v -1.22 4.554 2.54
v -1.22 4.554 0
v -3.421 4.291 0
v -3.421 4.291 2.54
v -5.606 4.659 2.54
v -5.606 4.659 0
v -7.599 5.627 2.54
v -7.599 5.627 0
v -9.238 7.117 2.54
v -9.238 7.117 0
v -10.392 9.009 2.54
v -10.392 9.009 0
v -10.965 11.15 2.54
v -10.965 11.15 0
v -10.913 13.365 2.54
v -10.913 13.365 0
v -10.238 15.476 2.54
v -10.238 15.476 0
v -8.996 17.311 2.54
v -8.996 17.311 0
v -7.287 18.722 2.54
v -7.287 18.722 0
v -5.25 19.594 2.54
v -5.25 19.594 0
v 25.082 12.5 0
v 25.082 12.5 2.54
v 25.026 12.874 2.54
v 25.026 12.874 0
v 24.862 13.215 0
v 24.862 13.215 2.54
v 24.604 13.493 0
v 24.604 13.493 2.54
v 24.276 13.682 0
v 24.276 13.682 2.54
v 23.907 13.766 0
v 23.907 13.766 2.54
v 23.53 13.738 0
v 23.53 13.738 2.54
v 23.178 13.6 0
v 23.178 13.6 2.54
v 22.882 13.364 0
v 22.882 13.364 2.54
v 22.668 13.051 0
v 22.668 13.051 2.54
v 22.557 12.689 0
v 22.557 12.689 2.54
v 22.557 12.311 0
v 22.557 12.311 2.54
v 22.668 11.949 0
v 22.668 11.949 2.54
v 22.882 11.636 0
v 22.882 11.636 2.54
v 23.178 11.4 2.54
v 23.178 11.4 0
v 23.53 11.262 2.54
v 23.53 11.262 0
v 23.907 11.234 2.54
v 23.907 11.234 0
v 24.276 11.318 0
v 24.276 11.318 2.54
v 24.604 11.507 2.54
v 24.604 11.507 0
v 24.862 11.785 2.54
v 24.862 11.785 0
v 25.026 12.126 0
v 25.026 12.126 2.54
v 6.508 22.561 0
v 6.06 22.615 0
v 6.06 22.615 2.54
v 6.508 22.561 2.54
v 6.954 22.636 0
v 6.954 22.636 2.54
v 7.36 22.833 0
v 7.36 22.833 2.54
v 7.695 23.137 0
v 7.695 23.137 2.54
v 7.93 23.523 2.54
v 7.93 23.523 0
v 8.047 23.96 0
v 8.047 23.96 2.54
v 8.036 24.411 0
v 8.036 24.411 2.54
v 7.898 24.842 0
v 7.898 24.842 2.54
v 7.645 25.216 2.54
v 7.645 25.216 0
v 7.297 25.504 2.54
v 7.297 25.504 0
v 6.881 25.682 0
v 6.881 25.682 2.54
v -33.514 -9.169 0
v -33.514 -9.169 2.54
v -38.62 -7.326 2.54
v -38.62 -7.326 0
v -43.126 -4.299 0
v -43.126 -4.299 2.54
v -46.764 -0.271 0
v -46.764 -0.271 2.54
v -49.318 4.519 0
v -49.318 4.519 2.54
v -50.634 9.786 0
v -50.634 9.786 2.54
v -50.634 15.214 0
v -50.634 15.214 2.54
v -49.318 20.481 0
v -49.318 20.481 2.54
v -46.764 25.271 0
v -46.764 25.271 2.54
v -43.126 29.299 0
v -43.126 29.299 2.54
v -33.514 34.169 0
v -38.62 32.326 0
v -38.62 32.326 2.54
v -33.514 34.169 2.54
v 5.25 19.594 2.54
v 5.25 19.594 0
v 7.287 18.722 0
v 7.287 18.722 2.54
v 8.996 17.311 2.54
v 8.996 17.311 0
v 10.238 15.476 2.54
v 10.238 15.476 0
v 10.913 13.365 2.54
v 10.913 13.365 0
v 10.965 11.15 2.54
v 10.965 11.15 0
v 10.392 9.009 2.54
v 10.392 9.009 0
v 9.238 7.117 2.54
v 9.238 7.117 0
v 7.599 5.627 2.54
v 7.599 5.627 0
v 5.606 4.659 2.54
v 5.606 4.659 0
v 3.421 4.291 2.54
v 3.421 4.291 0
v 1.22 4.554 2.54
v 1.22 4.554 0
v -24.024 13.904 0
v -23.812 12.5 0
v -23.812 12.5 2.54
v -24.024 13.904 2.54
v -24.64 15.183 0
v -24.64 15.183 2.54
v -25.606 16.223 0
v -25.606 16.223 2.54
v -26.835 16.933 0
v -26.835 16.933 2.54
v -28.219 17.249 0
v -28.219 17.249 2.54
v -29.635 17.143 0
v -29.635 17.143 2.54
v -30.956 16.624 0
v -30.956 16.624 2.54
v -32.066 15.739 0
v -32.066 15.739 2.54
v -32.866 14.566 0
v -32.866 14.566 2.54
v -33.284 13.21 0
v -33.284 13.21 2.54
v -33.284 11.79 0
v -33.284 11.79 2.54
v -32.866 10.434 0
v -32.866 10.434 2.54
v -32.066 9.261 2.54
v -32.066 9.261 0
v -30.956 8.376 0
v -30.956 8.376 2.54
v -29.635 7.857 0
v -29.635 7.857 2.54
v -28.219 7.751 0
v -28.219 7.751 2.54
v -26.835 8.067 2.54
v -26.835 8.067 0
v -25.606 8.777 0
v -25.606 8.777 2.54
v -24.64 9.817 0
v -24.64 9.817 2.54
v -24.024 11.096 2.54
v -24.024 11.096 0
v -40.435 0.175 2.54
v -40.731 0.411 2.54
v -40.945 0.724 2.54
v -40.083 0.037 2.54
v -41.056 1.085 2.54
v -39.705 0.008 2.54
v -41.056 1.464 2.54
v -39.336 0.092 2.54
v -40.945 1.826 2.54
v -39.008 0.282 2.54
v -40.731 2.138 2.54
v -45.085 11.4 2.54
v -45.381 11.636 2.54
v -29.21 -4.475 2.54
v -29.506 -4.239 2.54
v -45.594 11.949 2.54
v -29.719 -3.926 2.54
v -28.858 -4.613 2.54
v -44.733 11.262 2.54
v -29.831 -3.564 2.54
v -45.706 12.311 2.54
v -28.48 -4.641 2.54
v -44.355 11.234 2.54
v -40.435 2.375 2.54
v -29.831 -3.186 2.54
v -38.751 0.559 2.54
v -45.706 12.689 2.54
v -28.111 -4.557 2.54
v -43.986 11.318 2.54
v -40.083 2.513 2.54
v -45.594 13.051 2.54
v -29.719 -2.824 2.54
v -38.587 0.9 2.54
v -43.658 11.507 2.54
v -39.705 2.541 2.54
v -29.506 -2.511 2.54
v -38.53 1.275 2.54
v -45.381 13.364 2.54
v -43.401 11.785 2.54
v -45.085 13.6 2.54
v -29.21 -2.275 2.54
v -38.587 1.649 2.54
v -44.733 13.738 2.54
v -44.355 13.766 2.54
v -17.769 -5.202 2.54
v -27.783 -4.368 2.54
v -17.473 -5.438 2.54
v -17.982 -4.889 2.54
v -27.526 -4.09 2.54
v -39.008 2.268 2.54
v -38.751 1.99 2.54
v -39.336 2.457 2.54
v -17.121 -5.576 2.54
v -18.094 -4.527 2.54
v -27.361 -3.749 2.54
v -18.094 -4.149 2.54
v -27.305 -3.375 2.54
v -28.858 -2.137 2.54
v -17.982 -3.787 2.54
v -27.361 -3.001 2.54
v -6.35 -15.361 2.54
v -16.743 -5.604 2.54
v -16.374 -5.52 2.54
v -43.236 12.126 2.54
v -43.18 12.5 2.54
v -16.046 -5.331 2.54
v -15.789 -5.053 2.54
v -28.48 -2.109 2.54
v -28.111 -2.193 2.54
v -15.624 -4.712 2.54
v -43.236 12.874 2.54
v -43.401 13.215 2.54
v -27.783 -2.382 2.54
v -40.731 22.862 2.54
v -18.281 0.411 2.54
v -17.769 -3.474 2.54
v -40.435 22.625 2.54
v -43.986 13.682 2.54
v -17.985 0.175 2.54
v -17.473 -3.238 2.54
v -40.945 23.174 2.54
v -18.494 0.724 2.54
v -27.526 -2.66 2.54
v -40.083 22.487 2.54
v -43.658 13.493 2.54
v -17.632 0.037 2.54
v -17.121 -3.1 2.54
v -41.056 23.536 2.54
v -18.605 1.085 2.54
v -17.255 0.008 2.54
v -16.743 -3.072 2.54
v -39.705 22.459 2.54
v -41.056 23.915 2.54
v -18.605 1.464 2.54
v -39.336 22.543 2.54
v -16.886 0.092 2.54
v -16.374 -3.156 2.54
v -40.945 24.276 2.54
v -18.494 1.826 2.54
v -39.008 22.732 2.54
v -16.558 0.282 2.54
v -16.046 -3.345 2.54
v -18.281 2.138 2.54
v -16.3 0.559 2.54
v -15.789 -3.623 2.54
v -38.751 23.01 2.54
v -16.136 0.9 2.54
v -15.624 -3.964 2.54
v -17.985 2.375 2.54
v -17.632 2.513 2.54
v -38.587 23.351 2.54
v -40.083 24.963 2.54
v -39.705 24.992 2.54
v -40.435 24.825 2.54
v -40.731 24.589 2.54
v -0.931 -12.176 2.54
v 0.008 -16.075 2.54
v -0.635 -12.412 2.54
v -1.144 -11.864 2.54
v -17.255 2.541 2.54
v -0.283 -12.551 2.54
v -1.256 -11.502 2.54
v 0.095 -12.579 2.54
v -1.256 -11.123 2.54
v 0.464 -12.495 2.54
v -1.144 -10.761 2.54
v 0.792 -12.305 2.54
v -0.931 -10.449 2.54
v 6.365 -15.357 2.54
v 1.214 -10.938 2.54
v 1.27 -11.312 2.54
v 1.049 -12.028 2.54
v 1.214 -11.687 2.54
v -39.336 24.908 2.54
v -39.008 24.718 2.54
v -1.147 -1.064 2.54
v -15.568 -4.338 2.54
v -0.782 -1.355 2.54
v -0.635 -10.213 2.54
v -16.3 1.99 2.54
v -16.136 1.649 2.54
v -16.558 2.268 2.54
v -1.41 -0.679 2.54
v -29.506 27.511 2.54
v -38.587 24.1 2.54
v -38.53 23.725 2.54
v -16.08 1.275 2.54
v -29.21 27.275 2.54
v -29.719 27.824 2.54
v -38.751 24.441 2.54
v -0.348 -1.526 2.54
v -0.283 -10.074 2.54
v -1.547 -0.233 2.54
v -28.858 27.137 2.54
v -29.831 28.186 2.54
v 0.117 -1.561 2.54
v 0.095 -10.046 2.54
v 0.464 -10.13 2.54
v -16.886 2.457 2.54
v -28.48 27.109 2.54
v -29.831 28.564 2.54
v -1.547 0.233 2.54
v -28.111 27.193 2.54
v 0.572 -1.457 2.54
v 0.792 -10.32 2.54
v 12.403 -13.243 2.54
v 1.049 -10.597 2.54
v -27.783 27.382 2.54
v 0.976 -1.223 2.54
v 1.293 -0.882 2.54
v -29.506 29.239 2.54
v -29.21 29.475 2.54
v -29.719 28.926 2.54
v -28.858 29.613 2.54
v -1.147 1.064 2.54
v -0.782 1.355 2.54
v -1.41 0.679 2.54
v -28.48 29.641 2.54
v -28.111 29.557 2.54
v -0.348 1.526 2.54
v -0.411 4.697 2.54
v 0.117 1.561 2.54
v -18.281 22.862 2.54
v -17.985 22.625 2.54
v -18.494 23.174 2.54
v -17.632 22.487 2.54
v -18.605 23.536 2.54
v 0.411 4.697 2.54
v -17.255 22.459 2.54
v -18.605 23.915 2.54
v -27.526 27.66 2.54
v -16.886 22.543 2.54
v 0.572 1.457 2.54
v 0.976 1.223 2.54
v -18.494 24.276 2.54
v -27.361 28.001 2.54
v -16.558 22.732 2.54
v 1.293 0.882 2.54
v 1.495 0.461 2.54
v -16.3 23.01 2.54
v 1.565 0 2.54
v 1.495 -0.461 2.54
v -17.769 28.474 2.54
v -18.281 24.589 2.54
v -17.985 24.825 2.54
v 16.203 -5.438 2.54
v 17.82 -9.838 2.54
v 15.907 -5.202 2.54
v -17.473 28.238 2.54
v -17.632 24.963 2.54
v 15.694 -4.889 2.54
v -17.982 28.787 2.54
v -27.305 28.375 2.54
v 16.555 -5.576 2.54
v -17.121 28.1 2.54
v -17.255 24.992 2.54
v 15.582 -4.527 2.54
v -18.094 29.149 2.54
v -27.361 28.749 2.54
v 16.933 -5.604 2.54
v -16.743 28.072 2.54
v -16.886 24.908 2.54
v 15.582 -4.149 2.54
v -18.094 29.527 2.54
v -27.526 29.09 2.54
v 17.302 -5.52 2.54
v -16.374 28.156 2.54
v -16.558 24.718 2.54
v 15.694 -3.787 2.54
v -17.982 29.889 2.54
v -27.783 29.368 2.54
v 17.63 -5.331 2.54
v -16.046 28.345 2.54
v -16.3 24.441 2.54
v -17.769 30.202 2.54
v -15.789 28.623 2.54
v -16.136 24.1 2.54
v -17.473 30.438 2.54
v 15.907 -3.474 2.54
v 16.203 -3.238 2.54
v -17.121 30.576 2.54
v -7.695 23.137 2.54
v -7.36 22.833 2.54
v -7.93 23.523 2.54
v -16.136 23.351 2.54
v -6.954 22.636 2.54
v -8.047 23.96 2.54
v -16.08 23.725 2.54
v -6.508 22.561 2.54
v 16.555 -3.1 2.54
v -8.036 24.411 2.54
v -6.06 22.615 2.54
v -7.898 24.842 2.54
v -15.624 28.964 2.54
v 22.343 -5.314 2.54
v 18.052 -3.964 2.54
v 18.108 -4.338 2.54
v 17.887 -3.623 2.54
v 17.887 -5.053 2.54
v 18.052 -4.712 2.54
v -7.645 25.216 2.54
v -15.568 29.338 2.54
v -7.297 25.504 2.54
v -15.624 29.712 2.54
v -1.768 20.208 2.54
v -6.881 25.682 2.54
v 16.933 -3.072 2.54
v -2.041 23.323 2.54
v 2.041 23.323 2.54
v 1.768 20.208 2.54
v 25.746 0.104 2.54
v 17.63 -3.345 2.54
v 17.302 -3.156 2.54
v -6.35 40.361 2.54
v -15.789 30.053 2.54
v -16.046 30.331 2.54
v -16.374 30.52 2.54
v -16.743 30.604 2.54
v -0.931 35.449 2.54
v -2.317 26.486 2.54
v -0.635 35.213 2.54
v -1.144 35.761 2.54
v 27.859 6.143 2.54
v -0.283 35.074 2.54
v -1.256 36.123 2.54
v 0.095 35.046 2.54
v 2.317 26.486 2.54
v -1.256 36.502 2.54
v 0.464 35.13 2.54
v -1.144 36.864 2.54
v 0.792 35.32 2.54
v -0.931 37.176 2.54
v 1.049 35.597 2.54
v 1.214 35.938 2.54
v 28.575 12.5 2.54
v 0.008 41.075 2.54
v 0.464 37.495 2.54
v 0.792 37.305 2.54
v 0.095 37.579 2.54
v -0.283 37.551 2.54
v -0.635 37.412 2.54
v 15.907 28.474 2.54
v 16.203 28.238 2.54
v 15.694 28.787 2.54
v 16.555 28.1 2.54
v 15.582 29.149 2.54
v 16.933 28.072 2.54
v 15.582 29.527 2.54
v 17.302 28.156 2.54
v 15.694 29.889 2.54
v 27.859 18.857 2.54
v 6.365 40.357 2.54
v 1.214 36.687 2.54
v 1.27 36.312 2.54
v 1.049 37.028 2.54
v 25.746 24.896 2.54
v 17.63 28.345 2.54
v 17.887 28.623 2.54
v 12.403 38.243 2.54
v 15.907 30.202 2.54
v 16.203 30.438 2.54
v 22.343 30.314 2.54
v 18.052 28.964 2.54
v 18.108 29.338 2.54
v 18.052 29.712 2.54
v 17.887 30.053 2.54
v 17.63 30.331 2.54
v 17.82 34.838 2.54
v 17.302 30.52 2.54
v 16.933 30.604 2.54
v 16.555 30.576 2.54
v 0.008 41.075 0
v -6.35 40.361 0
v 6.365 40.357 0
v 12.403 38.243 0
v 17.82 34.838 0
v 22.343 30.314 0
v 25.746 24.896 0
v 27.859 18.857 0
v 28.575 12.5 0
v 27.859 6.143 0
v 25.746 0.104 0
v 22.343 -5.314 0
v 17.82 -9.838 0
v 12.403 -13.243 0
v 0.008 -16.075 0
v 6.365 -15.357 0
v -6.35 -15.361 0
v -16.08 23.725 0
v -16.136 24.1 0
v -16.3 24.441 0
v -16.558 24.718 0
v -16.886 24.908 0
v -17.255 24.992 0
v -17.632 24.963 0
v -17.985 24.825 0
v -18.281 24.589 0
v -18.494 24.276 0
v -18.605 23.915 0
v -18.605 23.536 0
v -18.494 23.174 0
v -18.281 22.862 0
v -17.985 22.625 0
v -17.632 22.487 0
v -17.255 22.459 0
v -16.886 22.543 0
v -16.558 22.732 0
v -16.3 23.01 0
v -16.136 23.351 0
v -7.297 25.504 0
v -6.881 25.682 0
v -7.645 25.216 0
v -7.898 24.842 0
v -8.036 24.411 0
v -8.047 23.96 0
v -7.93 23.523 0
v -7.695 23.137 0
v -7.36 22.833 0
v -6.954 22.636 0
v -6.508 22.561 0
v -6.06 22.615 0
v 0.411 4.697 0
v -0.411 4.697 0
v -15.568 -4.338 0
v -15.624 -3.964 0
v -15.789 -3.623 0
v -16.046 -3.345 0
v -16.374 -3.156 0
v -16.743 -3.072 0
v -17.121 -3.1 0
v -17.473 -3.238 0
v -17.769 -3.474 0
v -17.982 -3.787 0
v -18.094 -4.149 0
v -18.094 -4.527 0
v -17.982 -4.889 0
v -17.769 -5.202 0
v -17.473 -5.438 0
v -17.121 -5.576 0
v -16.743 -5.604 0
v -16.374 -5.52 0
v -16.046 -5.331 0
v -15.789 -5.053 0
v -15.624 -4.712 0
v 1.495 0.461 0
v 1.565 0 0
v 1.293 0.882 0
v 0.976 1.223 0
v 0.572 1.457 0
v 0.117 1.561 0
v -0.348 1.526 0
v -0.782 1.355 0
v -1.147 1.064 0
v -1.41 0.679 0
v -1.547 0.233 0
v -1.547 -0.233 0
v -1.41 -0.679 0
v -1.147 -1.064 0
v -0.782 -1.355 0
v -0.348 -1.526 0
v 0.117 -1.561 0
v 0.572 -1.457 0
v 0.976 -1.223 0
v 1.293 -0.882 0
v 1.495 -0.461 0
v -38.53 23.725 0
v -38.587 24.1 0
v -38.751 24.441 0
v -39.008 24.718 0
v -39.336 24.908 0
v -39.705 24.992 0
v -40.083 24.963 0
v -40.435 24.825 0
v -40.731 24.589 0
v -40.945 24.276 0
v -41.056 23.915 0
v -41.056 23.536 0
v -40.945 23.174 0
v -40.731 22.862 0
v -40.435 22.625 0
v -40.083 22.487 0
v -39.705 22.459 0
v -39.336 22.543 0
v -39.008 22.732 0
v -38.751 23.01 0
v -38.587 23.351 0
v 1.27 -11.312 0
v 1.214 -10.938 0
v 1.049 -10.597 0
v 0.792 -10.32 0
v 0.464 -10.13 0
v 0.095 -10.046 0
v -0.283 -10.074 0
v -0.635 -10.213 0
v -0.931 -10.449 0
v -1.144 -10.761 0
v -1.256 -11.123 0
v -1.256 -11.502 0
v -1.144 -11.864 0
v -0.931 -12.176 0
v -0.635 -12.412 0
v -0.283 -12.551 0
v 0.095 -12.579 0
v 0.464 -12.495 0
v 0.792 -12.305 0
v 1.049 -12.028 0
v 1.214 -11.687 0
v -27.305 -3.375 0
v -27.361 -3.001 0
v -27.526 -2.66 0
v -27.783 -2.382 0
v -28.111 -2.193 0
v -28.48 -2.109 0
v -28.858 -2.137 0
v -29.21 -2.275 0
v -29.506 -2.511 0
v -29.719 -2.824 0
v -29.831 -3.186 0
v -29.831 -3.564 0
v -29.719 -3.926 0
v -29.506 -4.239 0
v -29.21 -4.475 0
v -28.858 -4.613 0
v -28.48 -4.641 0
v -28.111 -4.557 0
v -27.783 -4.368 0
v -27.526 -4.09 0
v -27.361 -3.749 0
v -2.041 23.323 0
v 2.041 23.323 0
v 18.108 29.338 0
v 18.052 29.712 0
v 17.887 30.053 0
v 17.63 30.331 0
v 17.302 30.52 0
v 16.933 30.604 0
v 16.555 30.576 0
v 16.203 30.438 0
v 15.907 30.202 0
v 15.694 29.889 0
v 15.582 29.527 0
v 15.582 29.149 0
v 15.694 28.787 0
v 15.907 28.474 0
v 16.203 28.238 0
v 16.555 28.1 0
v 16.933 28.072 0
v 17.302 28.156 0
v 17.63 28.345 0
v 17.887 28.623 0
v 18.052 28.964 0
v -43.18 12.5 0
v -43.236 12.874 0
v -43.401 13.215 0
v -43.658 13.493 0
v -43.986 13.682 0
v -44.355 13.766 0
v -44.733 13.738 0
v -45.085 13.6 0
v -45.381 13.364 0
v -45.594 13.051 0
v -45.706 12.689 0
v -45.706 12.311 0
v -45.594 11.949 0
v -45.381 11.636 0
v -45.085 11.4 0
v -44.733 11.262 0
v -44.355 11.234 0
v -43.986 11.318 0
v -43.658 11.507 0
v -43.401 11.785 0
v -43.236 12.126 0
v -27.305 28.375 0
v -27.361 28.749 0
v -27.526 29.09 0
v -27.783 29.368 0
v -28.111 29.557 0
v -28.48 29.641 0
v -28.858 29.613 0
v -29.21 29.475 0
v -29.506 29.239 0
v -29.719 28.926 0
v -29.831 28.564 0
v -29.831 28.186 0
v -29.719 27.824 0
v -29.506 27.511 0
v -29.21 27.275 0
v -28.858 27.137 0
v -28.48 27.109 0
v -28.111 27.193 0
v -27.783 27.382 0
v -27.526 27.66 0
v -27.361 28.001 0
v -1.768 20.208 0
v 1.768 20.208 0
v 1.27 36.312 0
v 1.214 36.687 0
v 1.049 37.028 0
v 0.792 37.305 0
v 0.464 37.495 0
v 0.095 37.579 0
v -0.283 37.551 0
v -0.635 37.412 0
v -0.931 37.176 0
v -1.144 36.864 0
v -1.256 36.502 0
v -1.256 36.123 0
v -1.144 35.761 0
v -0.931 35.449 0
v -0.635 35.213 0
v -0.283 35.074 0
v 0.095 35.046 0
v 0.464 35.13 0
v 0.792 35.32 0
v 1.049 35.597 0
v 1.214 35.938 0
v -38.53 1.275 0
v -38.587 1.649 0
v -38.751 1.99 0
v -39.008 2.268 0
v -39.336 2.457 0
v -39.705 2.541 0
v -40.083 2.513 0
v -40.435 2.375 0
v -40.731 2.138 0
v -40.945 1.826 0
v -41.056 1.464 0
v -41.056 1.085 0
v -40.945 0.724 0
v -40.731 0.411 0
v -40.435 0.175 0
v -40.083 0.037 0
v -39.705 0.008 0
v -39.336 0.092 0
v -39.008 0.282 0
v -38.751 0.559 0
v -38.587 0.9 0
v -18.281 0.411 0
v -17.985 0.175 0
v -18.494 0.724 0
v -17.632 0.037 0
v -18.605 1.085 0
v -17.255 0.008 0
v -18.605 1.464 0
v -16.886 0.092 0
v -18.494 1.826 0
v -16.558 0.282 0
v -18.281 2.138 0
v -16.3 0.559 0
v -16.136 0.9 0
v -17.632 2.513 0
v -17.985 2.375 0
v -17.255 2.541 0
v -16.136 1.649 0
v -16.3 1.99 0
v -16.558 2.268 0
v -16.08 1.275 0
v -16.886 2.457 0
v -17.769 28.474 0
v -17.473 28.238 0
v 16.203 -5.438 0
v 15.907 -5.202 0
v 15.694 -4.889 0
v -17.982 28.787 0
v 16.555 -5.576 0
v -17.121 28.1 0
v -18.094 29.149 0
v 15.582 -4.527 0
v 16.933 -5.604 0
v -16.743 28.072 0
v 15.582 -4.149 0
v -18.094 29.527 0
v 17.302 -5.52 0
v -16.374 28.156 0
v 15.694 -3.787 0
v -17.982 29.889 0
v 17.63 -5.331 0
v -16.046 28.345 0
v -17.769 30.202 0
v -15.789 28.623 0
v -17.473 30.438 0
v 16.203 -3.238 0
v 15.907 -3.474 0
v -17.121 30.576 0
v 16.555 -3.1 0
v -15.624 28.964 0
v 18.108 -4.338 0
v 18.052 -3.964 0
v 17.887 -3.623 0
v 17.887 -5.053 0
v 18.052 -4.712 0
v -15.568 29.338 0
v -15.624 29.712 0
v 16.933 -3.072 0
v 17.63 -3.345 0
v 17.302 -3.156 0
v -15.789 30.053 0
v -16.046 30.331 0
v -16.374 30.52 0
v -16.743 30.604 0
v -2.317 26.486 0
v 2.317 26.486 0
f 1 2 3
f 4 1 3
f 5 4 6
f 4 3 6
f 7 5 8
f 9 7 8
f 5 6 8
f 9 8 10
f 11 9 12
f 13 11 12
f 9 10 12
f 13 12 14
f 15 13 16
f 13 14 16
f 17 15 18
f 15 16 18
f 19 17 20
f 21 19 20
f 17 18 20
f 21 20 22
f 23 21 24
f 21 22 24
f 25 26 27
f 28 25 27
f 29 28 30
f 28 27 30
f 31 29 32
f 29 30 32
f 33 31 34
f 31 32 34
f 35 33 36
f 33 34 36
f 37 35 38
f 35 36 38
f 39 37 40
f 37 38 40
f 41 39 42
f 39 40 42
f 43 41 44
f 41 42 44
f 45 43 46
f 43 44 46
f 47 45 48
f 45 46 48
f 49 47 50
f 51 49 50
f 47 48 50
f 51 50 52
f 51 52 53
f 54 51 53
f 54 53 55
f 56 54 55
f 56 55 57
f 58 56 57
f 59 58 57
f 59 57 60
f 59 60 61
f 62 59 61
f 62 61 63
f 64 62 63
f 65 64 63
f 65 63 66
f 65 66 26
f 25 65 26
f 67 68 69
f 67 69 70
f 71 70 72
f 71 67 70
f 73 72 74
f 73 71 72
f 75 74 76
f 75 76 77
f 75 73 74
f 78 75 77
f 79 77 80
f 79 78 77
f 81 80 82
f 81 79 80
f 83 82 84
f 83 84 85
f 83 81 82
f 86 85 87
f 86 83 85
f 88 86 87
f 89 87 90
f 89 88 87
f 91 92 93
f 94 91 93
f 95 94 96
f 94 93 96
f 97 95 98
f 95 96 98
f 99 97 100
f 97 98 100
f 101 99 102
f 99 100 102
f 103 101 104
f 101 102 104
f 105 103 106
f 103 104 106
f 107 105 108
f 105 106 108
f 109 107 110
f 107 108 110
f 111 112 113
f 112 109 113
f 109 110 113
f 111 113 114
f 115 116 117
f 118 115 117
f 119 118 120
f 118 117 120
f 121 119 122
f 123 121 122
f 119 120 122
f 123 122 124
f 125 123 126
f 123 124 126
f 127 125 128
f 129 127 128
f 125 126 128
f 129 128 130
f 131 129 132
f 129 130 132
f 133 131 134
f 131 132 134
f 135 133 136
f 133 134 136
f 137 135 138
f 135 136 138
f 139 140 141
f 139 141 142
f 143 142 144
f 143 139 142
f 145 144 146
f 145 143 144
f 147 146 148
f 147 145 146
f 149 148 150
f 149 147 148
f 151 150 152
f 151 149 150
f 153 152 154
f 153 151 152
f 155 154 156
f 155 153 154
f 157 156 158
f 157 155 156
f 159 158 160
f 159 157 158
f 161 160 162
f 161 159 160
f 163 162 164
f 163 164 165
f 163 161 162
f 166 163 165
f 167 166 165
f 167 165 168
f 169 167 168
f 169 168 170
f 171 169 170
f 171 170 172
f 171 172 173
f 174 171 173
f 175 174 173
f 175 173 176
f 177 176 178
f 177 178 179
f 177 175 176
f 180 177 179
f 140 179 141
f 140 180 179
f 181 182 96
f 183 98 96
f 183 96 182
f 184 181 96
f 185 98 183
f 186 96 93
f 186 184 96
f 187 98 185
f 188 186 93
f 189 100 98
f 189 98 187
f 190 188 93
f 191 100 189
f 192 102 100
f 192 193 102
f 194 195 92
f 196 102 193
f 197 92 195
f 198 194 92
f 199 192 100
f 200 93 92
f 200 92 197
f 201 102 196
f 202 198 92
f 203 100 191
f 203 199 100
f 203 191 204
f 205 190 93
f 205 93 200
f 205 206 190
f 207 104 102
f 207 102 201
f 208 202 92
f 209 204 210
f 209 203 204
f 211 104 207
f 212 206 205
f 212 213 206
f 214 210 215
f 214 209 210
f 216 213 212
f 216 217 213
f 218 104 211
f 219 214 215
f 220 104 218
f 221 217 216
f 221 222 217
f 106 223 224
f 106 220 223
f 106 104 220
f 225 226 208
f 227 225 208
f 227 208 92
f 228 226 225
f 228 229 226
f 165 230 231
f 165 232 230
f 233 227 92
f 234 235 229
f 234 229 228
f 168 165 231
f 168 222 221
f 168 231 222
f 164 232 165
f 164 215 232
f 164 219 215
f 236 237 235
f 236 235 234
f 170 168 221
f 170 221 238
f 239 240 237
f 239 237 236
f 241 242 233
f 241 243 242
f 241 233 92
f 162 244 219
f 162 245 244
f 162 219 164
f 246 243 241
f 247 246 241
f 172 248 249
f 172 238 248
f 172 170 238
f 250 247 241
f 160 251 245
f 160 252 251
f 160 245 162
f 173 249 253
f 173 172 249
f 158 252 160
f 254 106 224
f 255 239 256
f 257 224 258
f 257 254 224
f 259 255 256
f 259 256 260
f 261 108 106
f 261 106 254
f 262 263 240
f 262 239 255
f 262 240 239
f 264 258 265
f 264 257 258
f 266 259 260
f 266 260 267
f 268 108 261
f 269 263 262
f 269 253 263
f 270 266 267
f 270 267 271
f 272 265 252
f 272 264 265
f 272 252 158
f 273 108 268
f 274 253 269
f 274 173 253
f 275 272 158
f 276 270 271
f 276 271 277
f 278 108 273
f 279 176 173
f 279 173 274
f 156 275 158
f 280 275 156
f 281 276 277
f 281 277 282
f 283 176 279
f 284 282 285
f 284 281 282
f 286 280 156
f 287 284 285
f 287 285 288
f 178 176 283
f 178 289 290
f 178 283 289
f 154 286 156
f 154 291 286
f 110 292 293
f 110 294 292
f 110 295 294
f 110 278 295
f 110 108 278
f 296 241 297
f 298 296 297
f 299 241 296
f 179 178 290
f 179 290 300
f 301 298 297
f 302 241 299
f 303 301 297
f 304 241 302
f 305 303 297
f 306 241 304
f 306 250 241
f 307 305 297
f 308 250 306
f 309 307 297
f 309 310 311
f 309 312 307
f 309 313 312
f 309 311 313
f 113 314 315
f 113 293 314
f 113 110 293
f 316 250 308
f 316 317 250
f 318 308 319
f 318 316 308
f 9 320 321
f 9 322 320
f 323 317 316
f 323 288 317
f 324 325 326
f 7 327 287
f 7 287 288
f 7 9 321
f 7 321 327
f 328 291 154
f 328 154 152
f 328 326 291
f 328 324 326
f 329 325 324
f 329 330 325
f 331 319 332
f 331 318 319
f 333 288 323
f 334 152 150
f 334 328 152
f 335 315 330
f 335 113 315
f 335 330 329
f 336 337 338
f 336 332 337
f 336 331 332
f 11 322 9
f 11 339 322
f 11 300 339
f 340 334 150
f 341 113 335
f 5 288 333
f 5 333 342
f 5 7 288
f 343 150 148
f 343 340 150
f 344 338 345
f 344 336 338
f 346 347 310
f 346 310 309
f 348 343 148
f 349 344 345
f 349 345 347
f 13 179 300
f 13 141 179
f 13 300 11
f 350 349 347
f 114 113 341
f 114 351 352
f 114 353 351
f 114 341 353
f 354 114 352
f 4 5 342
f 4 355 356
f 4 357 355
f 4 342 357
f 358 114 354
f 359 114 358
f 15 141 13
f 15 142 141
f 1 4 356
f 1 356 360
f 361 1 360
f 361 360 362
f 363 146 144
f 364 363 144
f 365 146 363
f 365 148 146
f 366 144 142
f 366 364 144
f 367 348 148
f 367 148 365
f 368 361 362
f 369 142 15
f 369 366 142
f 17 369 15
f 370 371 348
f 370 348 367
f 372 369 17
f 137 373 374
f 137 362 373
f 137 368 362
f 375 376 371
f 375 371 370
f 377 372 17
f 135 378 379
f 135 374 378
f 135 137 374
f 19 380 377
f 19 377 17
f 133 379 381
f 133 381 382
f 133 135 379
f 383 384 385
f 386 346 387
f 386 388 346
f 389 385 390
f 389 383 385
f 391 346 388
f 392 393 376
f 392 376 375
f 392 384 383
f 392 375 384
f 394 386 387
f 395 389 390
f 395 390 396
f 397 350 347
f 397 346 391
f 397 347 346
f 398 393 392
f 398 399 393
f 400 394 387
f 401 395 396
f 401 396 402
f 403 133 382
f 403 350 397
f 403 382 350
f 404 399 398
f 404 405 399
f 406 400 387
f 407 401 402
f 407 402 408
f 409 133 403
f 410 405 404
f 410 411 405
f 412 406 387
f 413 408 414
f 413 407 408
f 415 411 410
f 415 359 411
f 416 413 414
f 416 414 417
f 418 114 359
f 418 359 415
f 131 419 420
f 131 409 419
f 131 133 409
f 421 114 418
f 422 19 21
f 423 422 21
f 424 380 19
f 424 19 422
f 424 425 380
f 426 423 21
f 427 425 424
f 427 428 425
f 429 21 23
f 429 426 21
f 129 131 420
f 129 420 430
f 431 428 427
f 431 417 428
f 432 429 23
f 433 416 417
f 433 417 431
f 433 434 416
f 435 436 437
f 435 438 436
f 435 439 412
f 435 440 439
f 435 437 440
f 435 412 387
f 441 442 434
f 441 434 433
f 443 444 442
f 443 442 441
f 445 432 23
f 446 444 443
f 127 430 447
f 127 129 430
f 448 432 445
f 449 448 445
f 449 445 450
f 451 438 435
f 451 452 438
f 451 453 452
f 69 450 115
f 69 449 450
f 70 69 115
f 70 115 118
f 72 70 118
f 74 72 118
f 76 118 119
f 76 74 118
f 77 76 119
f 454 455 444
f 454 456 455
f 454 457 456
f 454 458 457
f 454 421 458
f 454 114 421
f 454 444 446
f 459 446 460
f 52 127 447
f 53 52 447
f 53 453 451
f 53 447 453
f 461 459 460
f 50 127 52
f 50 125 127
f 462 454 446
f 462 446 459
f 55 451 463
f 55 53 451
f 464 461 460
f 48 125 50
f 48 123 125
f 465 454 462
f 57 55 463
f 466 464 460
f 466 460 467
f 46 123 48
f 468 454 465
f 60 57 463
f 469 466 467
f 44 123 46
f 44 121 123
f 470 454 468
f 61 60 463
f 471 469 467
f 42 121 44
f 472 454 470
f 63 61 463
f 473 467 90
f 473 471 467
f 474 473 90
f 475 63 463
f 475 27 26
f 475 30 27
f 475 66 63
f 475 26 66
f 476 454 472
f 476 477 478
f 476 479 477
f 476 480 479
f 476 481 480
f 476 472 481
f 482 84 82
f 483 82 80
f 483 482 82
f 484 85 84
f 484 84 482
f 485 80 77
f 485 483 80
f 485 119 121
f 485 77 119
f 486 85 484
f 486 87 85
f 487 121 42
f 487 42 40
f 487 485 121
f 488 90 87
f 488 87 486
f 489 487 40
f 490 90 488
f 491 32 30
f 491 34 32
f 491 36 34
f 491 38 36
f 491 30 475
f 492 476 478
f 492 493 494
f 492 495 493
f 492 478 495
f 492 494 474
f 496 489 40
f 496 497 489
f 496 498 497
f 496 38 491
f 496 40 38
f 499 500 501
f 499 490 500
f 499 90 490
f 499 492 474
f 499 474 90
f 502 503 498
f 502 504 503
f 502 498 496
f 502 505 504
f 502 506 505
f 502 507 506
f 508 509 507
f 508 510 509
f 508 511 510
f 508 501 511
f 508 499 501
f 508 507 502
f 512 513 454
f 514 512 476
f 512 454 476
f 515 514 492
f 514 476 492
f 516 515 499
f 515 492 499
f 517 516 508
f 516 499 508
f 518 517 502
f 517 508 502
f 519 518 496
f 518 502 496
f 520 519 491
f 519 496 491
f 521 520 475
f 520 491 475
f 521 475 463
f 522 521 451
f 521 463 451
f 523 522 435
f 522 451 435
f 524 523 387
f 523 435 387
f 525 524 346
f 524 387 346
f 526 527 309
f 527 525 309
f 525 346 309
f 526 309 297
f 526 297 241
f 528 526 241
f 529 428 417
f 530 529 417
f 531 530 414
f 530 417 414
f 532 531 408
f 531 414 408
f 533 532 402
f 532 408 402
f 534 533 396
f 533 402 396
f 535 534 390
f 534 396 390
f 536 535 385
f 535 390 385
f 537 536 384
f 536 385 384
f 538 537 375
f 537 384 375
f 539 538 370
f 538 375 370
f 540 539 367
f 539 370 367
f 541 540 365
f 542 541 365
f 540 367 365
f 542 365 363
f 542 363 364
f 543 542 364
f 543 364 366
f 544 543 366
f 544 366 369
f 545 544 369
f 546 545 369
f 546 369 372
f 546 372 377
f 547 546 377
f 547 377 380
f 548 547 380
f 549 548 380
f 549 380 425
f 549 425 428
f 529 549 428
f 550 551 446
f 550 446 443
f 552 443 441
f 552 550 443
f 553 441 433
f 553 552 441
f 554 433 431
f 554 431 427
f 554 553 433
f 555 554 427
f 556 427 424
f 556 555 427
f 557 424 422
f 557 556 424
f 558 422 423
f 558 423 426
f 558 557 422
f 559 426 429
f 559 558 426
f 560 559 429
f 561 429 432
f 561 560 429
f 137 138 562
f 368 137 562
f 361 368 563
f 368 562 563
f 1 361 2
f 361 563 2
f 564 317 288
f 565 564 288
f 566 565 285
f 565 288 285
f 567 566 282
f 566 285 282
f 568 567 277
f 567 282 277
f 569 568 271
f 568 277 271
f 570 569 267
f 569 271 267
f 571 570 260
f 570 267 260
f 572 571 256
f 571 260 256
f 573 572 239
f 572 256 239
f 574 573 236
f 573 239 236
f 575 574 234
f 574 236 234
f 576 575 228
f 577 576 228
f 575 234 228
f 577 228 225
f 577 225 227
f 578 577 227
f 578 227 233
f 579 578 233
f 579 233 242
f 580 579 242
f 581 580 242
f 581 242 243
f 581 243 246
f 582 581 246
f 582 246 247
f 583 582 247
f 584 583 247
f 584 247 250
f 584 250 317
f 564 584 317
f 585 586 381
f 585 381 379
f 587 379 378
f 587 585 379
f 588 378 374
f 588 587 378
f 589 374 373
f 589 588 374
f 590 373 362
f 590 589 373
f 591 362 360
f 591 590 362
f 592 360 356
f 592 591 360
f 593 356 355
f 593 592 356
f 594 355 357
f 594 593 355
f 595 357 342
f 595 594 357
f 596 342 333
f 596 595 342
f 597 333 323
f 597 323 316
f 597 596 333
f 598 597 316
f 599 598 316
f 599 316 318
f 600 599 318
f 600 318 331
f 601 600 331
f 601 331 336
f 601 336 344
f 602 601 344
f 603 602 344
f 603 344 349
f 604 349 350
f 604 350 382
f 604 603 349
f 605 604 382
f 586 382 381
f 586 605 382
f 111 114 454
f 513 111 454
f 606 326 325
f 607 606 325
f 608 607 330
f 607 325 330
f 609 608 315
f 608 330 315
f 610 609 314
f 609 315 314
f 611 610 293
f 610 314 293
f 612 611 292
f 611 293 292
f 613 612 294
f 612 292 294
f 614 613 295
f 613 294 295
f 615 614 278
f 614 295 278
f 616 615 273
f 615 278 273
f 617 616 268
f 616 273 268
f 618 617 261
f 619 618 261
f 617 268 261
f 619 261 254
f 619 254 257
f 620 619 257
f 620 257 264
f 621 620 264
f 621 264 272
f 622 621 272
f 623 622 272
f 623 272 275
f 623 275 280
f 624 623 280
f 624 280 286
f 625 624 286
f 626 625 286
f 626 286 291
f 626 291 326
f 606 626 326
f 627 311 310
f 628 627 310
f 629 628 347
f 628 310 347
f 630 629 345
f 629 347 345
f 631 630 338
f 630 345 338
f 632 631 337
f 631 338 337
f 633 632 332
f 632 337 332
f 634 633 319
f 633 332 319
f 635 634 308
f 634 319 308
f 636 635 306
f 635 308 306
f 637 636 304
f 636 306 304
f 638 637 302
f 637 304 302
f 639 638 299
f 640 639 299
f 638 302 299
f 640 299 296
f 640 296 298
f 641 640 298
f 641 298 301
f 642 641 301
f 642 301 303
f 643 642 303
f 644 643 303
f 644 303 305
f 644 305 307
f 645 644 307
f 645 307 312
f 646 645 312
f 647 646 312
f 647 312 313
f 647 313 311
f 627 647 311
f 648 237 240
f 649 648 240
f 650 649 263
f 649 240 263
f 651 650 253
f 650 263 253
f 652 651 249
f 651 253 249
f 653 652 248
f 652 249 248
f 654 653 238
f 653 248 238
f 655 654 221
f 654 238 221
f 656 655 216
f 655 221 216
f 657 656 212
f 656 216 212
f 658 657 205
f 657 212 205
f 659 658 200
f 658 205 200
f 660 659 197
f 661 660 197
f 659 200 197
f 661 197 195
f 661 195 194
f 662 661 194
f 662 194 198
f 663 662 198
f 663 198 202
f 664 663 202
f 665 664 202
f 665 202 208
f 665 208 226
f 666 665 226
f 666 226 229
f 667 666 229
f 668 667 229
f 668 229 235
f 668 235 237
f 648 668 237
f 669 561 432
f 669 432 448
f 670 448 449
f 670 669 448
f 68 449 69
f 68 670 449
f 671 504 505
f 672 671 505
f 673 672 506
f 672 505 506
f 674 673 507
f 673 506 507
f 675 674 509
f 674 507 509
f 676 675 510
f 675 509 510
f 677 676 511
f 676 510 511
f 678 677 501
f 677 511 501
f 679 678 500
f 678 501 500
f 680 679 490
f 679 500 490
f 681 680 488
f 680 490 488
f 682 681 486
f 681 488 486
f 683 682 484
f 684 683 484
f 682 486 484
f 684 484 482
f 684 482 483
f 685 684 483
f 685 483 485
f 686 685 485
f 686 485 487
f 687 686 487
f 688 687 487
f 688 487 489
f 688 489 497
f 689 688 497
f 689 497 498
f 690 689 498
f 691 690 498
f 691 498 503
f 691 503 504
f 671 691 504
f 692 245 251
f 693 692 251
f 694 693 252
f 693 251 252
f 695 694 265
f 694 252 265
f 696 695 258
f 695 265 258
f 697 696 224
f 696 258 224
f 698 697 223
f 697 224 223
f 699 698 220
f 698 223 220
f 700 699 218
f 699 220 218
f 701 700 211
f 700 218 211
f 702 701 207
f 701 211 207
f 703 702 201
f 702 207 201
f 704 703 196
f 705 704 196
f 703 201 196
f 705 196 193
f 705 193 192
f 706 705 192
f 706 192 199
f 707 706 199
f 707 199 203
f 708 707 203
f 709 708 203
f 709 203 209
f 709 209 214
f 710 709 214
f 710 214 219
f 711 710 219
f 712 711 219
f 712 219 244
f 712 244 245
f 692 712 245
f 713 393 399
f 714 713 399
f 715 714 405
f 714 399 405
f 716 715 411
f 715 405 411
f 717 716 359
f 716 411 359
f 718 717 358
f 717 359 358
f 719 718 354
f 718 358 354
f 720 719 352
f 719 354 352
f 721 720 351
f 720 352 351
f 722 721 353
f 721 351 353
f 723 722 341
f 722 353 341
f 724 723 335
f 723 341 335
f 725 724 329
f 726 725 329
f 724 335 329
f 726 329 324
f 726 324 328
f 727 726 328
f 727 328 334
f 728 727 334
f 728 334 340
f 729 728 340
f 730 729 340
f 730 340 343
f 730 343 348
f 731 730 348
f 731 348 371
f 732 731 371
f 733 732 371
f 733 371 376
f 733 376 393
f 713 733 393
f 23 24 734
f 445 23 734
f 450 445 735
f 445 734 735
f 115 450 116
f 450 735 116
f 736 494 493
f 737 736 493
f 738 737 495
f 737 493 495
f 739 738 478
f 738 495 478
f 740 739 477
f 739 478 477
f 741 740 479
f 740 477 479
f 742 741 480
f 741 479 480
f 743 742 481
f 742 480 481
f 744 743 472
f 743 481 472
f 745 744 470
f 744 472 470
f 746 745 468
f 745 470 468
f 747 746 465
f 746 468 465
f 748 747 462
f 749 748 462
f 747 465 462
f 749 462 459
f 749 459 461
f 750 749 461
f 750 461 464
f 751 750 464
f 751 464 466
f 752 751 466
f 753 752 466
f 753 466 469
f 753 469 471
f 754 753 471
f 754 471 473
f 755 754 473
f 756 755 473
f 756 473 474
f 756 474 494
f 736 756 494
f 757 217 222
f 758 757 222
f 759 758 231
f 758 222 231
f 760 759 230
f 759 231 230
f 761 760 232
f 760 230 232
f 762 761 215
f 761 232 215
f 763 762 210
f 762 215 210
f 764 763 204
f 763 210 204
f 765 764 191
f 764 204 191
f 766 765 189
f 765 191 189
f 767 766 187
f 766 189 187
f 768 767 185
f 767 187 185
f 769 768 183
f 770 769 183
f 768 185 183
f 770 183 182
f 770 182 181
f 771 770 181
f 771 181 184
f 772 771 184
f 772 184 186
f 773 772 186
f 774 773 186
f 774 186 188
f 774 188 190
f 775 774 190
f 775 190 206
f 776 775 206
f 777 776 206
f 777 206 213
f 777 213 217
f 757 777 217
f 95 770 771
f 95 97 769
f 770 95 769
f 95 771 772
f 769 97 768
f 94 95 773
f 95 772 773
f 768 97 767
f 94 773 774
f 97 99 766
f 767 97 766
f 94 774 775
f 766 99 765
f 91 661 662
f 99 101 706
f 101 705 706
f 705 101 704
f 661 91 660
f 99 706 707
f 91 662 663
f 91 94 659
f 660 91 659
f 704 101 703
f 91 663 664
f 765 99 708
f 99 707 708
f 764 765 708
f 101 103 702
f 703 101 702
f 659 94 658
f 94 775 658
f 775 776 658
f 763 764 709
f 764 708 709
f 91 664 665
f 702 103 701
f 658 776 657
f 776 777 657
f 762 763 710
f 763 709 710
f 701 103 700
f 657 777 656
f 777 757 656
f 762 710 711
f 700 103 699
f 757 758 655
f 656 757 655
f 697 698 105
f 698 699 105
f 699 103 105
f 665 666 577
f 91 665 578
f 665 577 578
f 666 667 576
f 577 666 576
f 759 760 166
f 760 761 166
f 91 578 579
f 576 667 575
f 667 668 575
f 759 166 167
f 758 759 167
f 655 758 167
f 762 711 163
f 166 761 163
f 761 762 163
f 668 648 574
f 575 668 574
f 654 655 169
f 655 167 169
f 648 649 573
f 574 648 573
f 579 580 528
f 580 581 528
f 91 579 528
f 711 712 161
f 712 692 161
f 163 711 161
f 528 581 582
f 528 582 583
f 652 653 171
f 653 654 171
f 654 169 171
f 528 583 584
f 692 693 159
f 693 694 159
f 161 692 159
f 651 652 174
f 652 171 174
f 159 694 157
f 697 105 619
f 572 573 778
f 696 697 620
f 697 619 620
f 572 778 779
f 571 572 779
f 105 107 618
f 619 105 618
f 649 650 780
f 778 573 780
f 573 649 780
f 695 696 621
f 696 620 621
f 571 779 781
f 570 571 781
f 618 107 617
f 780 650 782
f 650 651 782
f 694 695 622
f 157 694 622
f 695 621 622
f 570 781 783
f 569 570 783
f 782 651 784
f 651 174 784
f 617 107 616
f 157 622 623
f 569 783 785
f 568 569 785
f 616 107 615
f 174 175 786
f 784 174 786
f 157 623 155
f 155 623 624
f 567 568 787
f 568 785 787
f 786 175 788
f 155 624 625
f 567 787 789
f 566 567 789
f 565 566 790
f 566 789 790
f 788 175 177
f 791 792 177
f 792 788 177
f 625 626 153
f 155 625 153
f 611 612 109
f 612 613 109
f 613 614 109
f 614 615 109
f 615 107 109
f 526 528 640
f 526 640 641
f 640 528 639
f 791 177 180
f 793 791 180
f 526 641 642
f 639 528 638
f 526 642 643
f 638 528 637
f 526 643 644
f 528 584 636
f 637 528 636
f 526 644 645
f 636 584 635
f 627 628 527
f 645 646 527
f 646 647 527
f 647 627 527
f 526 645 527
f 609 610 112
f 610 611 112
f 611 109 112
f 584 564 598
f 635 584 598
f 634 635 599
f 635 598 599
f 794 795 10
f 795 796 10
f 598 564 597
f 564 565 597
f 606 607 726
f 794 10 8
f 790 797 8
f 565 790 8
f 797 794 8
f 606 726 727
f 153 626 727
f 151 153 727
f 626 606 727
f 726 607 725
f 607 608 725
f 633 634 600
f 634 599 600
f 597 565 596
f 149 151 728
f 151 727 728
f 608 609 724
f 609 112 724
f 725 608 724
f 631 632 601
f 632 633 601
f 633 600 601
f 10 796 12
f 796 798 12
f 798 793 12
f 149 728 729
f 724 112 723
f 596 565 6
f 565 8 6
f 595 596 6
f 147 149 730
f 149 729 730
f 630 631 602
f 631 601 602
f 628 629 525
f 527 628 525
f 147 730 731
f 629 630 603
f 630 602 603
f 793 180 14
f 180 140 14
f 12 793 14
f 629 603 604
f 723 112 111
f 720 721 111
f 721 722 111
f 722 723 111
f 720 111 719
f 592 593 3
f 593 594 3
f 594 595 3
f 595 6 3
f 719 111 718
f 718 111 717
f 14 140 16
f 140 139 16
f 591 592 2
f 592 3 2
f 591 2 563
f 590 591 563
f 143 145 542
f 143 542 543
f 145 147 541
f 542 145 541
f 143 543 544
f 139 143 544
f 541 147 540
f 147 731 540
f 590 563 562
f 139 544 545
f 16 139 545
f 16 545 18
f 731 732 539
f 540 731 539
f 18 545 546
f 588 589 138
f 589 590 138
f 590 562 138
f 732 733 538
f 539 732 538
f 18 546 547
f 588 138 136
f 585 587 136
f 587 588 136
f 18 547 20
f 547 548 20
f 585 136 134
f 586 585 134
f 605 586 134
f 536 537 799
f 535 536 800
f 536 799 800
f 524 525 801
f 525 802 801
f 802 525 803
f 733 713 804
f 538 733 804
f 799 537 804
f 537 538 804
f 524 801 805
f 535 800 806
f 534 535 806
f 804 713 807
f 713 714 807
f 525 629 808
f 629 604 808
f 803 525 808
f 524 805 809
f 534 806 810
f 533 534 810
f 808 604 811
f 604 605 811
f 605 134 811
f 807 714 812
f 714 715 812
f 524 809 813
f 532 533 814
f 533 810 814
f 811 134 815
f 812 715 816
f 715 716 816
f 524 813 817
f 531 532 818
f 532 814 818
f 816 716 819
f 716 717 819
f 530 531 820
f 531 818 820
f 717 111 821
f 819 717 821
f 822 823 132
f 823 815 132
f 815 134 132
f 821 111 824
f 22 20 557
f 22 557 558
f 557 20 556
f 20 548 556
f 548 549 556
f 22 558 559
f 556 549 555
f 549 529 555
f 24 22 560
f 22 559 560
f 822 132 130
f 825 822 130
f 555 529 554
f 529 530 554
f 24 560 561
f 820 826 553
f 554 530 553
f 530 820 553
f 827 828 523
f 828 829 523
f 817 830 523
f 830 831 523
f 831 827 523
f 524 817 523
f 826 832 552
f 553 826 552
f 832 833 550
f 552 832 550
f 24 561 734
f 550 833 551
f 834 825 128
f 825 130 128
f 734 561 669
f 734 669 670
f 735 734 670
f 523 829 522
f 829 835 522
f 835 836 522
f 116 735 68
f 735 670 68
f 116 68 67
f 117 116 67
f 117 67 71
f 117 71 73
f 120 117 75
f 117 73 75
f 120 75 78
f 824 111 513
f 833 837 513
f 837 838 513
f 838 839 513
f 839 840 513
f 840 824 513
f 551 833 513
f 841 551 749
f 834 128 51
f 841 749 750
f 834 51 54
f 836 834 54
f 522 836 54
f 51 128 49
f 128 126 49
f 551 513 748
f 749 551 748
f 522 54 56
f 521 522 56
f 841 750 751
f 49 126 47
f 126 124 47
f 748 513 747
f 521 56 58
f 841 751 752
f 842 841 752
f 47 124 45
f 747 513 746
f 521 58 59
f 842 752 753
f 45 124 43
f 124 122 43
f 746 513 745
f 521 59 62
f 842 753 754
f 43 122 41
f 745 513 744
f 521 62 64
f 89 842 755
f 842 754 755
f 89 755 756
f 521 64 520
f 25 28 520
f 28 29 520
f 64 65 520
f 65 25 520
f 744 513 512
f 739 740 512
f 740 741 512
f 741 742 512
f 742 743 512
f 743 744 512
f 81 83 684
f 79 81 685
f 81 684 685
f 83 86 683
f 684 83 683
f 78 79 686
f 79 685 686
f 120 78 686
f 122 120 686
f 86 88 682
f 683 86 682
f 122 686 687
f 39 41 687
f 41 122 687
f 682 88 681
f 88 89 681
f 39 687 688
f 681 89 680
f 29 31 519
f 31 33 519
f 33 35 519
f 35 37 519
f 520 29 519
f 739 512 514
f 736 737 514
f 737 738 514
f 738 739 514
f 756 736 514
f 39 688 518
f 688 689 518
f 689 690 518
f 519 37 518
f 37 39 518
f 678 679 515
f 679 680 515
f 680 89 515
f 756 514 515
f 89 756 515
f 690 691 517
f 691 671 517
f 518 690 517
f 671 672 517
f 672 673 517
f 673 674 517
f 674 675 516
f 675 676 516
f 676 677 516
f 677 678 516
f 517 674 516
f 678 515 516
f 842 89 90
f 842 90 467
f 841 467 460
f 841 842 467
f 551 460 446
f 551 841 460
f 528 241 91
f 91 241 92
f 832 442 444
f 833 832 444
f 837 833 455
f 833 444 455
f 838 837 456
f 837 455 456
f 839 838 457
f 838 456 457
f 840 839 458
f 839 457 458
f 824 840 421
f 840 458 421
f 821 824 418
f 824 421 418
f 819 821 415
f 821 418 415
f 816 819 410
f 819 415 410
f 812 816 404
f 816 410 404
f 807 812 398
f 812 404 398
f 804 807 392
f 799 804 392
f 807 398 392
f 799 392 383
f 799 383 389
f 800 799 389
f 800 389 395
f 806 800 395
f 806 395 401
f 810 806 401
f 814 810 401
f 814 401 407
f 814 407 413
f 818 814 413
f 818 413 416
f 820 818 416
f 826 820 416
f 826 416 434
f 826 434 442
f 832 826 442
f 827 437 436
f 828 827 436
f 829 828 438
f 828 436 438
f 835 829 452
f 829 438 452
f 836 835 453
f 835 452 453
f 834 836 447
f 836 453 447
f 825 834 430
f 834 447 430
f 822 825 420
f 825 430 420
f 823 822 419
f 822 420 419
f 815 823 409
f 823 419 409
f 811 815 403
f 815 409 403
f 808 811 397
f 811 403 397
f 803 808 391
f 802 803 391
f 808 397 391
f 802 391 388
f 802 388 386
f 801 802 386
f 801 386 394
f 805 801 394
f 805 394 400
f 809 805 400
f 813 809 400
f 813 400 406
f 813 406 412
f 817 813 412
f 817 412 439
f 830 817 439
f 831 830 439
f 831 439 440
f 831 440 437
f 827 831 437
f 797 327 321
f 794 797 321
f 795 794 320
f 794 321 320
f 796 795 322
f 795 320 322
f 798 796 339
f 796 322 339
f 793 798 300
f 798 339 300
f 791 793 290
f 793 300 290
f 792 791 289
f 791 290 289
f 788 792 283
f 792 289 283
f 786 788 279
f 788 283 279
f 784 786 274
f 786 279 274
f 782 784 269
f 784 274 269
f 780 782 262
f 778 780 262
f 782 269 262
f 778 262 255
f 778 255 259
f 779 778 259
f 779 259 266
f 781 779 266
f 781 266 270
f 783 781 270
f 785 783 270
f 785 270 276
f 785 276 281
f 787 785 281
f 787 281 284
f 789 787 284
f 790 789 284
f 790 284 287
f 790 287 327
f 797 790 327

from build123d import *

# Parameters (mm, degrees)
SKETCH1_W           = 127
SKETCH1_H           = 88.9
SKETCH1_R           = 1.564880276
SKETCH1_R_2         = 4.7625
BOSS_EXTRUDE1_DEPTH = 2.54
SKETCH2_W           = 177.519600035
SKETCH2_H           = 126.718171086
CUT_EXTRUDE1_DEPTH  = 108.831991492
SKETCH4_R           = 1.27
CUT_EXTRUDE2_DEPTH  = 66.377727285


with BuildPart() as part:
    # Sketch1 → Boss-Extrude1 (new body)
    with BuildSketch(Plane.XY):
        with Locations((-28.03132955, 12.5)):
            Rectangle(SKETCH1_W, SKETCH1_H)
        Circle(SKETCH1_R, mode=Mode.SUBTRACT)
        with Locations((-28.575, 12.5)):
            Circle(SKETCH1_R_2, mode=Mode.SUBTRACT)
        with BuildLine():
            ThreePointArc((5.250170212, 19.593901979), (10.755067214, 10.059140681), (1.220305916, 4.554243678))
            ThreePointArc((1.220305916, 4.554243678), (0, 4.7149), (-1.220305916, 4.554243678))
            ThreePointArc((-1.220305916, 4.554243678), (-10.755067214, 10.059140681), (-5.250170212, 19.593901979))
            ThreePointArc((-5.250170212, 19.593901979), (0, 20.2851), (5.250170212, 19.593901979))
        make_face(mode=Mode.SUBTRACT)
        with BuildLine():
            ThreePointArc((6.881351362, 25.681552906), (0, 26.5875), (-6.881351362, 25.681552906))
            ThreePointArc((-6.881351362, 25.681552906), (-8.003883377, 23.737270423), (-6.059600893, 22.614738408))
            ThreePointArc((-6.059600893, 22.614738408), (0, 23.4125), (6.059600893, 22.614738408))
            ThreePointArc((6.059600893, 22.614738408), (8.003883377, 23.737270423), (6.881351362, 25.681552906))
        make_face(mode=Mode.SUBTRACT)
    extrude(amount=BOSS_EXTRUDE1_DEPTH)

    # Sketch2 → Cut-Extrude1 (cut, through all)
    with BuildSketch(Plane.XY.offset(2.54)):
        with Locations((-18.257651528, 17.008273159)):
            Rectangle(SKETCH2_W, SKETCH2_H)
        with BuildLine():
            Line((-33.513888889, 34.169287057), (-6.35, 40.36051193))
            ThreePointArc((-6.35, 40.36051193), (28.575, 12.5), (-6.35, -15.36051193))
            Line((-6.35, -15.36051193), (-33.513888889, -9.169287057))
            ThreePointArc((-33.513888889, -9.169287057), (-50.8, 12.5), (-33.513888889, 34.169287057))
        make_face(mode=Mode.SUBTRACT)
    extrude(amount=-CUT_EXTRUDE1_DEPTH, mode=Mode.SUBTRACT)

    # Sketch4 → Cut-Extrude2 (cut, through all)
    with BuildSketch(Plane.XY.offset(2.54)):
        with Locations((-28.575, 28.375)):
            Circle(SKETCH4_R)
        with Locations((0, 36.3125)):
            Circle(SKETCH4_R)
        with Locations((-17.349679849, 23.725320151)):
            Circle(SKETCH4_R)
        with Locations((-17.349679849, 1.274679849)):
            Circle(SKETCH4_R)
        with Locations((-28.575, -3.375)):
            Circle(SKETCH4_R)
        with Locations((-39.800320151, 1.274679849)):
            Circle(SKETCH4_R)
        with Locations((-44.45, 12.5)):
            Circle(SKETCH4_R)
        with Locations((-39.800320151, 23.725320151)):
            Circle(SKETCH4_R)
        with Locations((16.837980227, 29.337980227)):
            Circle(SKETCH4_R)
        with Locations((23.8125, 12.5)):
            Circle(SKETCH4_R)
        with Locations((16.837980227, -4.337980227)):
            Circle(SKETCH4_R)
        with Locations((0, -11.3125)):
            Circle(SKETCH4_R)
        with Locations((-16.837980227, -4.337980227)):
            Circle(SKETCH4_R)
        with Locations((-16.837980227, 29.337980227)):
            Circle(SKETCH4_R)
    extrude(amount=-CUT_EXTRUDE2_DEPTH, mode=Mode.SUBTRACT)


solid = part.part
